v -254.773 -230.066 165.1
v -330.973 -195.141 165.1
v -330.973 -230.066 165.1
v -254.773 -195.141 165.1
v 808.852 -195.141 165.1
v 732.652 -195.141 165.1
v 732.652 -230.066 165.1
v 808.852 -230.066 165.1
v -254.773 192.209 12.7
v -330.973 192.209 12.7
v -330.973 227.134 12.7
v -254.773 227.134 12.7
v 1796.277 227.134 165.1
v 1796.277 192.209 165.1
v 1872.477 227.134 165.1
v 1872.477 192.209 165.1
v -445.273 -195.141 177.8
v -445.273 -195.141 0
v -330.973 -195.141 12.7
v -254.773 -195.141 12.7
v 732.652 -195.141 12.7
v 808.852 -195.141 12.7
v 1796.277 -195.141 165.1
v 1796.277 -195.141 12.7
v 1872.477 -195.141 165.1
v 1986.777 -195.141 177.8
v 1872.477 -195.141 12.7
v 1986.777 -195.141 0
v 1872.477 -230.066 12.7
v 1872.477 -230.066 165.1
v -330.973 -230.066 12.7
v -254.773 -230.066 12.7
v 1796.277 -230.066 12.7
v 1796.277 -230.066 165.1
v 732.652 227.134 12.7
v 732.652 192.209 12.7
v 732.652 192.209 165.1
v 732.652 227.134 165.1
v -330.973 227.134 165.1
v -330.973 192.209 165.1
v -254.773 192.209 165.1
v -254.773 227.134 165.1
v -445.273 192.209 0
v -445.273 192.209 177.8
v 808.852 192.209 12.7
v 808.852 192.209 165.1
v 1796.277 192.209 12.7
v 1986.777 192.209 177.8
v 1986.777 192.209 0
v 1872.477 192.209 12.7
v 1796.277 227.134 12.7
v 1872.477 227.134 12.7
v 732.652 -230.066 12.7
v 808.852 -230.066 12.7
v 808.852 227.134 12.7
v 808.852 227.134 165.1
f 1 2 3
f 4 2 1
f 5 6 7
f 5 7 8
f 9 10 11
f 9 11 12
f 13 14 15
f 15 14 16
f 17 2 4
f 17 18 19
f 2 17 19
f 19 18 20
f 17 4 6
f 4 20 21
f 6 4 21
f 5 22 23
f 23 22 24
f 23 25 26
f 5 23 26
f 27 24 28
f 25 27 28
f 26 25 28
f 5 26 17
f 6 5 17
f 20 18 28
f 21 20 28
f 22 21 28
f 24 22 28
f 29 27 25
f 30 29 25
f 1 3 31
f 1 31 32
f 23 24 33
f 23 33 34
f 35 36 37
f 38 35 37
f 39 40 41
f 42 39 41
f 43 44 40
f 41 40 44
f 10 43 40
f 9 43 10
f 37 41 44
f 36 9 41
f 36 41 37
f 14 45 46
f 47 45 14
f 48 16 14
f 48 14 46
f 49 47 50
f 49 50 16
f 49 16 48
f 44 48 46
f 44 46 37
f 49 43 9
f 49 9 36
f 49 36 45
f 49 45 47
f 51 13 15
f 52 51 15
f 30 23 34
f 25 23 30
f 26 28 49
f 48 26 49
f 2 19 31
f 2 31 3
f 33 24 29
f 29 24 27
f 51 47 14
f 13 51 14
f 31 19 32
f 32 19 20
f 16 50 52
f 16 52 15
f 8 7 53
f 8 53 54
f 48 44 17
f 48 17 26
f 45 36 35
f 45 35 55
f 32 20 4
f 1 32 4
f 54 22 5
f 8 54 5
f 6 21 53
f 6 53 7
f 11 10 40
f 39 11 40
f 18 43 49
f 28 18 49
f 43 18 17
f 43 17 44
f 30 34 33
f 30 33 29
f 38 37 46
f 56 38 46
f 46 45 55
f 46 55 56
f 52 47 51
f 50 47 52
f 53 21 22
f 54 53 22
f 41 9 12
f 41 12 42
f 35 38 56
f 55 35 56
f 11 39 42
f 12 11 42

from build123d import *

# Parameters (mm, degrees)
F0_W      = 2432.05
F0_H      = 387.35
F1_DEPTH  = 177.8
F6_W      = 76.2
F6_H      = 152.4
F7_DEPTH  = 34.925
F2_W      = 76.2
F2_H      = 152.4
F3_DEPTH  = 34.925
F8_DEPTH  = 422.275
F9_DEPTH  = 422.275
F4_W      = 76.2
F4_H      = 152.4
F10_DEPTH = 34.925
F5_DEPTH  = 422.275


with BuildPart() as f1:
    # F0 (on Top) → F1 (new body)
    with BuildSketch(Plane.XY):
        with Locations((770.752065, -1.466483)):
            Rectangle(F0_W, F0_H)
    extrude(amount=F1_DEPTH)

    # F6 (on face) → F7 (join)
    with BuildSketch(Plane.XZ.offset(195.141483)):
        with Locations((-292.872935, 88.9)):
            Rectangle(F6_W, F6_H)
    extrude(amount=F7_DEPTH)

    # F2 (on face) → F3 (join)
    with BuildSketch(Plane.XZ.offset(195.141483)):
        with Locations((1834.377065, 88.9)):
            Rectangle(F2_W, F2_H)
    extrude(amount=F3_DEPTH)

    # F2 (on face) → F8 (join)
    with BuildSketch(Plane.XZ.offset(195.141483)):
        with Locations((1834.377065, 88.9)):
            Rectangle(F2_W, F2_H)
    extrude(amount=-F8_DEPTH)

    # F6 (on face) → F9 (join)
    with BuildSketch(Plane.XZ.offset(195.141483)):
        with Locations((-292.872935, 88.9)):
            Rectangle(F6_W, F6_H)
    extrude(amount=-F9_DEPTH)

    # F4 (on face) → F10 (join)
    with BuildSketch(Plane.XZ.offset(195.141483)):
        with Locations((770.752065, 88.9)):
            Rectangle(F4_W, F4_H)
    extrude(amount=F10_DEPTH)

    # F4 (on face) → F5 (join)
    with BuildSketch(Plane.XZ.offset(195.141483)):
        with Locations((770.752065, 88.9)):
            Rectangle(F4_W, F4_H)
    extrude(amount=-F5_DEPTH)


solid = f1.part
